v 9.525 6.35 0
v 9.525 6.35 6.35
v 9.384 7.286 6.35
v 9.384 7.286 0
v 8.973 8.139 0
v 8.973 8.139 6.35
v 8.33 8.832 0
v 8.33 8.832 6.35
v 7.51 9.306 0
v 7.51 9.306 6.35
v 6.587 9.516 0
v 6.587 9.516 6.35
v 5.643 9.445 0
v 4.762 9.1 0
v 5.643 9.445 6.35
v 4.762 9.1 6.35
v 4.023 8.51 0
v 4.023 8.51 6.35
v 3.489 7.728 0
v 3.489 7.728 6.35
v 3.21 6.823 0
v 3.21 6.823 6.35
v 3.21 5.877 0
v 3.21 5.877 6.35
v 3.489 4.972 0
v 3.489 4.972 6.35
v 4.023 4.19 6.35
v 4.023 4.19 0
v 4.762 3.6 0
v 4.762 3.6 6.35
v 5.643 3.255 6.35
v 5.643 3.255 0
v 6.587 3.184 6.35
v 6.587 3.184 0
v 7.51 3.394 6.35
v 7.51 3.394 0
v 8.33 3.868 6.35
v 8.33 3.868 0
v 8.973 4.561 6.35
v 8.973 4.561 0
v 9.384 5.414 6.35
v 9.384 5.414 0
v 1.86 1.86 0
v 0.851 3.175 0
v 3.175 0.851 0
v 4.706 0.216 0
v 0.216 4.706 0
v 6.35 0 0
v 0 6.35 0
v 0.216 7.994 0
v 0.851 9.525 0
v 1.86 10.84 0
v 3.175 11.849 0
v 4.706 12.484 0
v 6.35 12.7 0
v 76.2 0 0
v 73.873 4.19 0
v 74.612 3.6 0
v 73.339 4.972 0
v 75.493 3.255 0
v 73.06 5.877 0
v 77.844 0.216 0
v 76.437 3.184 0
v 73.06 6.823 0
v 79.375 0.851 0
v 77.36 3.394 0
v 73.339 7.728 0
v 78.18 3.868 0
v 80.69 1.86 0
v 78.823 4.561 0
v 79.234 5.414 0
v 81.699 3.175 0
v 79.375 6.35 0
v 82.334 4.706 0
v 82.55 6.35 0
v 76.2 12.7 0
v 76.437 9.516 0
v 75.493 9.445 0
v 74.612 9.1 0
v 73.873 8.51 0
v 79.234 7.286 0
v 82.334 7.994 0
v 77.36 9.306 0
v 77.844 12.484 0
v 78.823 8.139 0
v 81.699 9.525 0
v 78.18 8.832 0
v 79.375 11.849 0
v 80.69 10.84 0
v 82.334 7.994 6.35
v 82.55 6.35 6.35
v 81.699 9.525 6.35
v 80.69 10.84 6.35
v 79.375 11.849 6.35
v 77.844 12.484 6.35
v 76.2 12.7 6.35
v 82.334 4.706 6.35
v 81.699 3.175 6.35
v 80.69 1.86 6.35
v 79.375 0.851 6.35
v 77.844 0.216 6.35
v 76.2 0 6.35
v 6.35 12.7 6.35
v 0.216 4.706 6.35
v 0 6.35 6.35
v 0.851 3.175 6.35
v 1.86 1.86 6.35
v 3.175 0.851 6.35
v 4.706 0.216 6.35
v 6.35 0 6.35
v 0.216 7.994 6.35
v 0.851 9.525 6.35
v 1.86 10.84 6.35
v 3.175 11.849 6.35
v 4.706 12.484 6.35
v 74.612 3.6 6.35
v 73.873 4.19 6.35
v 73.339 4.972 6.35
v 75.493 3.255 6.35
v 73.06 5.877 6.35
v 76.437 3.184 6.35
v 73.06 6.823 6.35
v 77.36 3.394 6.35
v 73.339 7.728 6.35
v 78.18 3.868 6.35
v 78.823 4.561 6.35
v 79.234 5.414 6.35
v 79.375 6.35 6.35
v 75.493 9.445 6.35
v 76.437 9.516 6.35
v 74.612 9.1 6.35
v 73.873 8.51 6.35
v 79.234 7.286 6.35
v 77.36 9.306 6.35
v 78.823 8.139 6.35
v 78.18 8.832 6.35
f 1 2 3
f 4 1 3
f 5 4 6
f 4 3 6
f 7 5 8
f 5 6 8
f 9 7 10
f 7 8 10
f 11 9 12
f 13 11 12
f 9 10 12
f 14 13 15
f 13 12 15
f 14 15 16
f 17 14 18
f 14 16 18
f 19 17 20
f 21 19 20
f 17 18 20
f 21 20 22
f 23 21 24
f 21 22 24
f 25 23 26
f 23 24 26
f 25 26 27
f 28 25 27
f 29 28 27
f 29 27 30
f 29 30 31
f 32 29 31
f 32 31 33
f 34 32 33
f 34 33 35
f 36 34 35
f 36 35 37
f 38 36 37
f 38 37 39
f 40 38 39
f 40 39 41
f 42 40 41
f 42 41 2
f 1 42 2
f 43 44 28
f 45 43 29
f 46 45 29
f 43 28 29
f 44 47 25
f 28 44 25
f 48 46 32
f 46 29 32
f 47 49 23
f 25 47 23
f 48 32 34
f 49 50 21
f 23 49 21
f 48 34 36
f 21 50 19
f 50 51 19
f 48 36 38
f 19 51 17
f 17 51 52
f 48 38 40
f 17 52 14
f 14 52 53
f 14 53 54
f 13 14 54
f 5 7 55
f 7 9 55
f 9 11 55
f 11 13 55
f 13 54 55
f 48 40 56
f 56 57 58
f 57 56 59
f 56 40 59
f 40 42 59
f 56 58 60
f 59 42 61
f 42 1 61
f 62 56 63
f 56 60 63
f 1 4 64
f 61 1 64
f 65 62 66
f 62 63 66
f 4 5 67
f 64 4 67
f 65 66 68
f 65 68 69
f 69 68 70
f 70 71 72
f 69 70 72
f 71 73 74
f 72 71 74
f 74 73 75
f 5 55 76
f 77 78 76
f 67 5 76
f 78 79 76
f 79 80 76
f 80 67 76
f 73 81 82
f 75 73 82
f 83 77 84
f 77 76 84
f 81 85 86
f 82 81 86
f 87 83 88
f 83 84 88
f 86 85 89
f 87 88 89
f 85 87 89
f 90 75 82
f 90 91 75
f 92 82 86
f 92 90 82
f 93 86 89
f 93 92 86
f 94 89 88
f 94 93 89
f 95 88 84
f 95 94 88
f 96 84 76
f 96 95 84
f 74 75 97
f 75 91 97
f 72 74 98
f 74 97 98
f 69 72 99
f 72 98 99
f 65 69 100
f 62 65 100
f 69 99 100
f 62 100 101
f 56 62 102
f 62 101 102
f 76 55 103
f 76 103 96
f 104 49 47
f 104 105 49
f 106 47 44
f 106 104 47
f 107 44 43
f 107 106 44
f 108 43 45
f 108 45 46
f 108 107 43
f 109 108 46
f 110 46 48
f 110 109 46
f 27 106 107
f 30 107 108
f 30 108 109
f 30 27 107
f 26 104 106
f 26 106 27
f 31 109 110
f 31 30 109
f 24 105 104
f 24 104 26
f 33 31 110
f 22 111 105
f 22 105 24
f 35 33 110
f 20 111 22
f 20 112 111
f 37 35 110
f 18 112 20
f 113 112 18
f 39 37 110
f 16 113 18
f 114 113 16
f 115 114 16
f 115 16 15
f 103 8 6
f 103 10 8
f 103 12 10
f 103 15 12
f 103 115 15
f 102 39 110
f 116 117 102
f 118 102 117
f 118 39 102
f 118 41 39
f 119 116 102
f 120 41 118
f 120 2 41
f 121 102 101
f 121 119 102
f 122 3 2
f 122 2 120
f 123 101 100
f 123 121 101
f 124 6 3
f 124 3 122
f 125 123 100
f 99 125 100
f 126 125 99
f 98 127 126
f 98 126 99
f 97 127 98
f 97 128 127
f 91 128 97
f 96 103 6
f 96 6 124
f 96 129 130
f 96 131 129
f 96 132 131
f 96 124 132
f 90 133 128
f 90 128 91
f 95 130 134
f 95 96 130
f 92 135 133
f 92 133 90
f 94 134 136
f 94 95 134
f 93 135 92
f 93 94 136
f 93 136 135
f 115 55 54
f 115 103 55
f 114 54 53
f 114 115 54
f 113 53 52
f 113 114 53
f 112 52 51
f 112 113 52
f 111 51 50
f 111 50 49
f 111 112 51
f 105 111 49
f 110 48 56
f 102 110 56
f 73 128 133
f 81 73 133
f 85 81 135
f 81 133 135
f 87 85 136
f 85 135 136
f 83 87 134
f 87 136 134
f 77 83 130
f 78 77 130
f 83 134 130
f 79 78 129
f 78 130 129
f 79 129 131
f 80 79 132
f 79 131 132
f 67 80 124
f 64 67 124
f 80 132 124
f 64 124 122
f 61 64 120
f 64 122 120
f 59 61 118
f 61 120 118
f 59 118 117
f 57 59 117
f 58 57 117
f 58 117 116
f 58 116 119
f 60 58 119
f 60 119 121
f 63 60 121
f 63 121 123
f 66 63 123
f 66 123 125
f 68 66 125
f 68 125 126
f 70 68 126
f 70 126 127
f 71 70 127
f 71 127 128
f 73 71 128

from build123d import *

# Parameters (mm, degrees)
SKETCH2_W          = 82.55
SKETCH2_H          = 12.7
CRANK_HANDLE_DEPTH = 6.35
EDGE_1_R           = 6.35
EDGE_2_R           = 6.35
EDGE_3_R           = 6.35
EDGE_4_R           = 6.35
SKETCH3_R          = 3.175
HOLES_DEPTH        = 84.762252835


with BuildPart() as part:
    # Sketch2 → Crank Handle (new body)
    with BuildSketch(Plane.XY):
        with Locations((41.275, 6.35)):
            Rectangle(SKETCH2_W, SKETCH2_H)
    extrude(amount=CRANK_HANDLE_DEPTH)

    # Edge 1
    edge_1_edges = [part.edges().sort_by_distance(p)[0] for p in [
        (82.55, 12.7, 3.175),
    ]]
    fillet(edge_1_edges, radius=EDGE_1_R)

    # Edge 2
    edge_2_edges = [part.edges().sort_by_distance(p)[0] for p in [
        (82.55, 0, 3.175),
    ]]
    fillet(edge_2_edges, radius=EDGE_2_R - 0.0001)  # a hair under: the kernel refuses the full size

    # Edge 3
    edge_3_edges = [part.edges().sort_by_distance(p)[0] for p in [
        (0, 12.7, 3.175),
    ]]
    fillet(edge_3_edges, radius=EDGE_3_R)

    # Edge 4
    edge_4_edges = [part.edges().sort_by_distance(p)[0] for p in [
        (0, 0, 3.175),
    ]]
    fillet(edge_4_edges, radius=EDGE_4_R - 0.0001)  # a hair under: the kernel refuses the full size

    # Sketch3 → Holes (cut, through all)
    with BuildSketch(Plane.XY.offset(6.35)):
        with Locations((6.35, 6.35)):
            Circle(SKETCH3_R)
        with Locations((76.2, 6.35)):
            Circle(SKETCH3_R)
    extrude(amount=-HOLES_DEPTH, mode=Mode.SUBTRACT)


solid = part.part
